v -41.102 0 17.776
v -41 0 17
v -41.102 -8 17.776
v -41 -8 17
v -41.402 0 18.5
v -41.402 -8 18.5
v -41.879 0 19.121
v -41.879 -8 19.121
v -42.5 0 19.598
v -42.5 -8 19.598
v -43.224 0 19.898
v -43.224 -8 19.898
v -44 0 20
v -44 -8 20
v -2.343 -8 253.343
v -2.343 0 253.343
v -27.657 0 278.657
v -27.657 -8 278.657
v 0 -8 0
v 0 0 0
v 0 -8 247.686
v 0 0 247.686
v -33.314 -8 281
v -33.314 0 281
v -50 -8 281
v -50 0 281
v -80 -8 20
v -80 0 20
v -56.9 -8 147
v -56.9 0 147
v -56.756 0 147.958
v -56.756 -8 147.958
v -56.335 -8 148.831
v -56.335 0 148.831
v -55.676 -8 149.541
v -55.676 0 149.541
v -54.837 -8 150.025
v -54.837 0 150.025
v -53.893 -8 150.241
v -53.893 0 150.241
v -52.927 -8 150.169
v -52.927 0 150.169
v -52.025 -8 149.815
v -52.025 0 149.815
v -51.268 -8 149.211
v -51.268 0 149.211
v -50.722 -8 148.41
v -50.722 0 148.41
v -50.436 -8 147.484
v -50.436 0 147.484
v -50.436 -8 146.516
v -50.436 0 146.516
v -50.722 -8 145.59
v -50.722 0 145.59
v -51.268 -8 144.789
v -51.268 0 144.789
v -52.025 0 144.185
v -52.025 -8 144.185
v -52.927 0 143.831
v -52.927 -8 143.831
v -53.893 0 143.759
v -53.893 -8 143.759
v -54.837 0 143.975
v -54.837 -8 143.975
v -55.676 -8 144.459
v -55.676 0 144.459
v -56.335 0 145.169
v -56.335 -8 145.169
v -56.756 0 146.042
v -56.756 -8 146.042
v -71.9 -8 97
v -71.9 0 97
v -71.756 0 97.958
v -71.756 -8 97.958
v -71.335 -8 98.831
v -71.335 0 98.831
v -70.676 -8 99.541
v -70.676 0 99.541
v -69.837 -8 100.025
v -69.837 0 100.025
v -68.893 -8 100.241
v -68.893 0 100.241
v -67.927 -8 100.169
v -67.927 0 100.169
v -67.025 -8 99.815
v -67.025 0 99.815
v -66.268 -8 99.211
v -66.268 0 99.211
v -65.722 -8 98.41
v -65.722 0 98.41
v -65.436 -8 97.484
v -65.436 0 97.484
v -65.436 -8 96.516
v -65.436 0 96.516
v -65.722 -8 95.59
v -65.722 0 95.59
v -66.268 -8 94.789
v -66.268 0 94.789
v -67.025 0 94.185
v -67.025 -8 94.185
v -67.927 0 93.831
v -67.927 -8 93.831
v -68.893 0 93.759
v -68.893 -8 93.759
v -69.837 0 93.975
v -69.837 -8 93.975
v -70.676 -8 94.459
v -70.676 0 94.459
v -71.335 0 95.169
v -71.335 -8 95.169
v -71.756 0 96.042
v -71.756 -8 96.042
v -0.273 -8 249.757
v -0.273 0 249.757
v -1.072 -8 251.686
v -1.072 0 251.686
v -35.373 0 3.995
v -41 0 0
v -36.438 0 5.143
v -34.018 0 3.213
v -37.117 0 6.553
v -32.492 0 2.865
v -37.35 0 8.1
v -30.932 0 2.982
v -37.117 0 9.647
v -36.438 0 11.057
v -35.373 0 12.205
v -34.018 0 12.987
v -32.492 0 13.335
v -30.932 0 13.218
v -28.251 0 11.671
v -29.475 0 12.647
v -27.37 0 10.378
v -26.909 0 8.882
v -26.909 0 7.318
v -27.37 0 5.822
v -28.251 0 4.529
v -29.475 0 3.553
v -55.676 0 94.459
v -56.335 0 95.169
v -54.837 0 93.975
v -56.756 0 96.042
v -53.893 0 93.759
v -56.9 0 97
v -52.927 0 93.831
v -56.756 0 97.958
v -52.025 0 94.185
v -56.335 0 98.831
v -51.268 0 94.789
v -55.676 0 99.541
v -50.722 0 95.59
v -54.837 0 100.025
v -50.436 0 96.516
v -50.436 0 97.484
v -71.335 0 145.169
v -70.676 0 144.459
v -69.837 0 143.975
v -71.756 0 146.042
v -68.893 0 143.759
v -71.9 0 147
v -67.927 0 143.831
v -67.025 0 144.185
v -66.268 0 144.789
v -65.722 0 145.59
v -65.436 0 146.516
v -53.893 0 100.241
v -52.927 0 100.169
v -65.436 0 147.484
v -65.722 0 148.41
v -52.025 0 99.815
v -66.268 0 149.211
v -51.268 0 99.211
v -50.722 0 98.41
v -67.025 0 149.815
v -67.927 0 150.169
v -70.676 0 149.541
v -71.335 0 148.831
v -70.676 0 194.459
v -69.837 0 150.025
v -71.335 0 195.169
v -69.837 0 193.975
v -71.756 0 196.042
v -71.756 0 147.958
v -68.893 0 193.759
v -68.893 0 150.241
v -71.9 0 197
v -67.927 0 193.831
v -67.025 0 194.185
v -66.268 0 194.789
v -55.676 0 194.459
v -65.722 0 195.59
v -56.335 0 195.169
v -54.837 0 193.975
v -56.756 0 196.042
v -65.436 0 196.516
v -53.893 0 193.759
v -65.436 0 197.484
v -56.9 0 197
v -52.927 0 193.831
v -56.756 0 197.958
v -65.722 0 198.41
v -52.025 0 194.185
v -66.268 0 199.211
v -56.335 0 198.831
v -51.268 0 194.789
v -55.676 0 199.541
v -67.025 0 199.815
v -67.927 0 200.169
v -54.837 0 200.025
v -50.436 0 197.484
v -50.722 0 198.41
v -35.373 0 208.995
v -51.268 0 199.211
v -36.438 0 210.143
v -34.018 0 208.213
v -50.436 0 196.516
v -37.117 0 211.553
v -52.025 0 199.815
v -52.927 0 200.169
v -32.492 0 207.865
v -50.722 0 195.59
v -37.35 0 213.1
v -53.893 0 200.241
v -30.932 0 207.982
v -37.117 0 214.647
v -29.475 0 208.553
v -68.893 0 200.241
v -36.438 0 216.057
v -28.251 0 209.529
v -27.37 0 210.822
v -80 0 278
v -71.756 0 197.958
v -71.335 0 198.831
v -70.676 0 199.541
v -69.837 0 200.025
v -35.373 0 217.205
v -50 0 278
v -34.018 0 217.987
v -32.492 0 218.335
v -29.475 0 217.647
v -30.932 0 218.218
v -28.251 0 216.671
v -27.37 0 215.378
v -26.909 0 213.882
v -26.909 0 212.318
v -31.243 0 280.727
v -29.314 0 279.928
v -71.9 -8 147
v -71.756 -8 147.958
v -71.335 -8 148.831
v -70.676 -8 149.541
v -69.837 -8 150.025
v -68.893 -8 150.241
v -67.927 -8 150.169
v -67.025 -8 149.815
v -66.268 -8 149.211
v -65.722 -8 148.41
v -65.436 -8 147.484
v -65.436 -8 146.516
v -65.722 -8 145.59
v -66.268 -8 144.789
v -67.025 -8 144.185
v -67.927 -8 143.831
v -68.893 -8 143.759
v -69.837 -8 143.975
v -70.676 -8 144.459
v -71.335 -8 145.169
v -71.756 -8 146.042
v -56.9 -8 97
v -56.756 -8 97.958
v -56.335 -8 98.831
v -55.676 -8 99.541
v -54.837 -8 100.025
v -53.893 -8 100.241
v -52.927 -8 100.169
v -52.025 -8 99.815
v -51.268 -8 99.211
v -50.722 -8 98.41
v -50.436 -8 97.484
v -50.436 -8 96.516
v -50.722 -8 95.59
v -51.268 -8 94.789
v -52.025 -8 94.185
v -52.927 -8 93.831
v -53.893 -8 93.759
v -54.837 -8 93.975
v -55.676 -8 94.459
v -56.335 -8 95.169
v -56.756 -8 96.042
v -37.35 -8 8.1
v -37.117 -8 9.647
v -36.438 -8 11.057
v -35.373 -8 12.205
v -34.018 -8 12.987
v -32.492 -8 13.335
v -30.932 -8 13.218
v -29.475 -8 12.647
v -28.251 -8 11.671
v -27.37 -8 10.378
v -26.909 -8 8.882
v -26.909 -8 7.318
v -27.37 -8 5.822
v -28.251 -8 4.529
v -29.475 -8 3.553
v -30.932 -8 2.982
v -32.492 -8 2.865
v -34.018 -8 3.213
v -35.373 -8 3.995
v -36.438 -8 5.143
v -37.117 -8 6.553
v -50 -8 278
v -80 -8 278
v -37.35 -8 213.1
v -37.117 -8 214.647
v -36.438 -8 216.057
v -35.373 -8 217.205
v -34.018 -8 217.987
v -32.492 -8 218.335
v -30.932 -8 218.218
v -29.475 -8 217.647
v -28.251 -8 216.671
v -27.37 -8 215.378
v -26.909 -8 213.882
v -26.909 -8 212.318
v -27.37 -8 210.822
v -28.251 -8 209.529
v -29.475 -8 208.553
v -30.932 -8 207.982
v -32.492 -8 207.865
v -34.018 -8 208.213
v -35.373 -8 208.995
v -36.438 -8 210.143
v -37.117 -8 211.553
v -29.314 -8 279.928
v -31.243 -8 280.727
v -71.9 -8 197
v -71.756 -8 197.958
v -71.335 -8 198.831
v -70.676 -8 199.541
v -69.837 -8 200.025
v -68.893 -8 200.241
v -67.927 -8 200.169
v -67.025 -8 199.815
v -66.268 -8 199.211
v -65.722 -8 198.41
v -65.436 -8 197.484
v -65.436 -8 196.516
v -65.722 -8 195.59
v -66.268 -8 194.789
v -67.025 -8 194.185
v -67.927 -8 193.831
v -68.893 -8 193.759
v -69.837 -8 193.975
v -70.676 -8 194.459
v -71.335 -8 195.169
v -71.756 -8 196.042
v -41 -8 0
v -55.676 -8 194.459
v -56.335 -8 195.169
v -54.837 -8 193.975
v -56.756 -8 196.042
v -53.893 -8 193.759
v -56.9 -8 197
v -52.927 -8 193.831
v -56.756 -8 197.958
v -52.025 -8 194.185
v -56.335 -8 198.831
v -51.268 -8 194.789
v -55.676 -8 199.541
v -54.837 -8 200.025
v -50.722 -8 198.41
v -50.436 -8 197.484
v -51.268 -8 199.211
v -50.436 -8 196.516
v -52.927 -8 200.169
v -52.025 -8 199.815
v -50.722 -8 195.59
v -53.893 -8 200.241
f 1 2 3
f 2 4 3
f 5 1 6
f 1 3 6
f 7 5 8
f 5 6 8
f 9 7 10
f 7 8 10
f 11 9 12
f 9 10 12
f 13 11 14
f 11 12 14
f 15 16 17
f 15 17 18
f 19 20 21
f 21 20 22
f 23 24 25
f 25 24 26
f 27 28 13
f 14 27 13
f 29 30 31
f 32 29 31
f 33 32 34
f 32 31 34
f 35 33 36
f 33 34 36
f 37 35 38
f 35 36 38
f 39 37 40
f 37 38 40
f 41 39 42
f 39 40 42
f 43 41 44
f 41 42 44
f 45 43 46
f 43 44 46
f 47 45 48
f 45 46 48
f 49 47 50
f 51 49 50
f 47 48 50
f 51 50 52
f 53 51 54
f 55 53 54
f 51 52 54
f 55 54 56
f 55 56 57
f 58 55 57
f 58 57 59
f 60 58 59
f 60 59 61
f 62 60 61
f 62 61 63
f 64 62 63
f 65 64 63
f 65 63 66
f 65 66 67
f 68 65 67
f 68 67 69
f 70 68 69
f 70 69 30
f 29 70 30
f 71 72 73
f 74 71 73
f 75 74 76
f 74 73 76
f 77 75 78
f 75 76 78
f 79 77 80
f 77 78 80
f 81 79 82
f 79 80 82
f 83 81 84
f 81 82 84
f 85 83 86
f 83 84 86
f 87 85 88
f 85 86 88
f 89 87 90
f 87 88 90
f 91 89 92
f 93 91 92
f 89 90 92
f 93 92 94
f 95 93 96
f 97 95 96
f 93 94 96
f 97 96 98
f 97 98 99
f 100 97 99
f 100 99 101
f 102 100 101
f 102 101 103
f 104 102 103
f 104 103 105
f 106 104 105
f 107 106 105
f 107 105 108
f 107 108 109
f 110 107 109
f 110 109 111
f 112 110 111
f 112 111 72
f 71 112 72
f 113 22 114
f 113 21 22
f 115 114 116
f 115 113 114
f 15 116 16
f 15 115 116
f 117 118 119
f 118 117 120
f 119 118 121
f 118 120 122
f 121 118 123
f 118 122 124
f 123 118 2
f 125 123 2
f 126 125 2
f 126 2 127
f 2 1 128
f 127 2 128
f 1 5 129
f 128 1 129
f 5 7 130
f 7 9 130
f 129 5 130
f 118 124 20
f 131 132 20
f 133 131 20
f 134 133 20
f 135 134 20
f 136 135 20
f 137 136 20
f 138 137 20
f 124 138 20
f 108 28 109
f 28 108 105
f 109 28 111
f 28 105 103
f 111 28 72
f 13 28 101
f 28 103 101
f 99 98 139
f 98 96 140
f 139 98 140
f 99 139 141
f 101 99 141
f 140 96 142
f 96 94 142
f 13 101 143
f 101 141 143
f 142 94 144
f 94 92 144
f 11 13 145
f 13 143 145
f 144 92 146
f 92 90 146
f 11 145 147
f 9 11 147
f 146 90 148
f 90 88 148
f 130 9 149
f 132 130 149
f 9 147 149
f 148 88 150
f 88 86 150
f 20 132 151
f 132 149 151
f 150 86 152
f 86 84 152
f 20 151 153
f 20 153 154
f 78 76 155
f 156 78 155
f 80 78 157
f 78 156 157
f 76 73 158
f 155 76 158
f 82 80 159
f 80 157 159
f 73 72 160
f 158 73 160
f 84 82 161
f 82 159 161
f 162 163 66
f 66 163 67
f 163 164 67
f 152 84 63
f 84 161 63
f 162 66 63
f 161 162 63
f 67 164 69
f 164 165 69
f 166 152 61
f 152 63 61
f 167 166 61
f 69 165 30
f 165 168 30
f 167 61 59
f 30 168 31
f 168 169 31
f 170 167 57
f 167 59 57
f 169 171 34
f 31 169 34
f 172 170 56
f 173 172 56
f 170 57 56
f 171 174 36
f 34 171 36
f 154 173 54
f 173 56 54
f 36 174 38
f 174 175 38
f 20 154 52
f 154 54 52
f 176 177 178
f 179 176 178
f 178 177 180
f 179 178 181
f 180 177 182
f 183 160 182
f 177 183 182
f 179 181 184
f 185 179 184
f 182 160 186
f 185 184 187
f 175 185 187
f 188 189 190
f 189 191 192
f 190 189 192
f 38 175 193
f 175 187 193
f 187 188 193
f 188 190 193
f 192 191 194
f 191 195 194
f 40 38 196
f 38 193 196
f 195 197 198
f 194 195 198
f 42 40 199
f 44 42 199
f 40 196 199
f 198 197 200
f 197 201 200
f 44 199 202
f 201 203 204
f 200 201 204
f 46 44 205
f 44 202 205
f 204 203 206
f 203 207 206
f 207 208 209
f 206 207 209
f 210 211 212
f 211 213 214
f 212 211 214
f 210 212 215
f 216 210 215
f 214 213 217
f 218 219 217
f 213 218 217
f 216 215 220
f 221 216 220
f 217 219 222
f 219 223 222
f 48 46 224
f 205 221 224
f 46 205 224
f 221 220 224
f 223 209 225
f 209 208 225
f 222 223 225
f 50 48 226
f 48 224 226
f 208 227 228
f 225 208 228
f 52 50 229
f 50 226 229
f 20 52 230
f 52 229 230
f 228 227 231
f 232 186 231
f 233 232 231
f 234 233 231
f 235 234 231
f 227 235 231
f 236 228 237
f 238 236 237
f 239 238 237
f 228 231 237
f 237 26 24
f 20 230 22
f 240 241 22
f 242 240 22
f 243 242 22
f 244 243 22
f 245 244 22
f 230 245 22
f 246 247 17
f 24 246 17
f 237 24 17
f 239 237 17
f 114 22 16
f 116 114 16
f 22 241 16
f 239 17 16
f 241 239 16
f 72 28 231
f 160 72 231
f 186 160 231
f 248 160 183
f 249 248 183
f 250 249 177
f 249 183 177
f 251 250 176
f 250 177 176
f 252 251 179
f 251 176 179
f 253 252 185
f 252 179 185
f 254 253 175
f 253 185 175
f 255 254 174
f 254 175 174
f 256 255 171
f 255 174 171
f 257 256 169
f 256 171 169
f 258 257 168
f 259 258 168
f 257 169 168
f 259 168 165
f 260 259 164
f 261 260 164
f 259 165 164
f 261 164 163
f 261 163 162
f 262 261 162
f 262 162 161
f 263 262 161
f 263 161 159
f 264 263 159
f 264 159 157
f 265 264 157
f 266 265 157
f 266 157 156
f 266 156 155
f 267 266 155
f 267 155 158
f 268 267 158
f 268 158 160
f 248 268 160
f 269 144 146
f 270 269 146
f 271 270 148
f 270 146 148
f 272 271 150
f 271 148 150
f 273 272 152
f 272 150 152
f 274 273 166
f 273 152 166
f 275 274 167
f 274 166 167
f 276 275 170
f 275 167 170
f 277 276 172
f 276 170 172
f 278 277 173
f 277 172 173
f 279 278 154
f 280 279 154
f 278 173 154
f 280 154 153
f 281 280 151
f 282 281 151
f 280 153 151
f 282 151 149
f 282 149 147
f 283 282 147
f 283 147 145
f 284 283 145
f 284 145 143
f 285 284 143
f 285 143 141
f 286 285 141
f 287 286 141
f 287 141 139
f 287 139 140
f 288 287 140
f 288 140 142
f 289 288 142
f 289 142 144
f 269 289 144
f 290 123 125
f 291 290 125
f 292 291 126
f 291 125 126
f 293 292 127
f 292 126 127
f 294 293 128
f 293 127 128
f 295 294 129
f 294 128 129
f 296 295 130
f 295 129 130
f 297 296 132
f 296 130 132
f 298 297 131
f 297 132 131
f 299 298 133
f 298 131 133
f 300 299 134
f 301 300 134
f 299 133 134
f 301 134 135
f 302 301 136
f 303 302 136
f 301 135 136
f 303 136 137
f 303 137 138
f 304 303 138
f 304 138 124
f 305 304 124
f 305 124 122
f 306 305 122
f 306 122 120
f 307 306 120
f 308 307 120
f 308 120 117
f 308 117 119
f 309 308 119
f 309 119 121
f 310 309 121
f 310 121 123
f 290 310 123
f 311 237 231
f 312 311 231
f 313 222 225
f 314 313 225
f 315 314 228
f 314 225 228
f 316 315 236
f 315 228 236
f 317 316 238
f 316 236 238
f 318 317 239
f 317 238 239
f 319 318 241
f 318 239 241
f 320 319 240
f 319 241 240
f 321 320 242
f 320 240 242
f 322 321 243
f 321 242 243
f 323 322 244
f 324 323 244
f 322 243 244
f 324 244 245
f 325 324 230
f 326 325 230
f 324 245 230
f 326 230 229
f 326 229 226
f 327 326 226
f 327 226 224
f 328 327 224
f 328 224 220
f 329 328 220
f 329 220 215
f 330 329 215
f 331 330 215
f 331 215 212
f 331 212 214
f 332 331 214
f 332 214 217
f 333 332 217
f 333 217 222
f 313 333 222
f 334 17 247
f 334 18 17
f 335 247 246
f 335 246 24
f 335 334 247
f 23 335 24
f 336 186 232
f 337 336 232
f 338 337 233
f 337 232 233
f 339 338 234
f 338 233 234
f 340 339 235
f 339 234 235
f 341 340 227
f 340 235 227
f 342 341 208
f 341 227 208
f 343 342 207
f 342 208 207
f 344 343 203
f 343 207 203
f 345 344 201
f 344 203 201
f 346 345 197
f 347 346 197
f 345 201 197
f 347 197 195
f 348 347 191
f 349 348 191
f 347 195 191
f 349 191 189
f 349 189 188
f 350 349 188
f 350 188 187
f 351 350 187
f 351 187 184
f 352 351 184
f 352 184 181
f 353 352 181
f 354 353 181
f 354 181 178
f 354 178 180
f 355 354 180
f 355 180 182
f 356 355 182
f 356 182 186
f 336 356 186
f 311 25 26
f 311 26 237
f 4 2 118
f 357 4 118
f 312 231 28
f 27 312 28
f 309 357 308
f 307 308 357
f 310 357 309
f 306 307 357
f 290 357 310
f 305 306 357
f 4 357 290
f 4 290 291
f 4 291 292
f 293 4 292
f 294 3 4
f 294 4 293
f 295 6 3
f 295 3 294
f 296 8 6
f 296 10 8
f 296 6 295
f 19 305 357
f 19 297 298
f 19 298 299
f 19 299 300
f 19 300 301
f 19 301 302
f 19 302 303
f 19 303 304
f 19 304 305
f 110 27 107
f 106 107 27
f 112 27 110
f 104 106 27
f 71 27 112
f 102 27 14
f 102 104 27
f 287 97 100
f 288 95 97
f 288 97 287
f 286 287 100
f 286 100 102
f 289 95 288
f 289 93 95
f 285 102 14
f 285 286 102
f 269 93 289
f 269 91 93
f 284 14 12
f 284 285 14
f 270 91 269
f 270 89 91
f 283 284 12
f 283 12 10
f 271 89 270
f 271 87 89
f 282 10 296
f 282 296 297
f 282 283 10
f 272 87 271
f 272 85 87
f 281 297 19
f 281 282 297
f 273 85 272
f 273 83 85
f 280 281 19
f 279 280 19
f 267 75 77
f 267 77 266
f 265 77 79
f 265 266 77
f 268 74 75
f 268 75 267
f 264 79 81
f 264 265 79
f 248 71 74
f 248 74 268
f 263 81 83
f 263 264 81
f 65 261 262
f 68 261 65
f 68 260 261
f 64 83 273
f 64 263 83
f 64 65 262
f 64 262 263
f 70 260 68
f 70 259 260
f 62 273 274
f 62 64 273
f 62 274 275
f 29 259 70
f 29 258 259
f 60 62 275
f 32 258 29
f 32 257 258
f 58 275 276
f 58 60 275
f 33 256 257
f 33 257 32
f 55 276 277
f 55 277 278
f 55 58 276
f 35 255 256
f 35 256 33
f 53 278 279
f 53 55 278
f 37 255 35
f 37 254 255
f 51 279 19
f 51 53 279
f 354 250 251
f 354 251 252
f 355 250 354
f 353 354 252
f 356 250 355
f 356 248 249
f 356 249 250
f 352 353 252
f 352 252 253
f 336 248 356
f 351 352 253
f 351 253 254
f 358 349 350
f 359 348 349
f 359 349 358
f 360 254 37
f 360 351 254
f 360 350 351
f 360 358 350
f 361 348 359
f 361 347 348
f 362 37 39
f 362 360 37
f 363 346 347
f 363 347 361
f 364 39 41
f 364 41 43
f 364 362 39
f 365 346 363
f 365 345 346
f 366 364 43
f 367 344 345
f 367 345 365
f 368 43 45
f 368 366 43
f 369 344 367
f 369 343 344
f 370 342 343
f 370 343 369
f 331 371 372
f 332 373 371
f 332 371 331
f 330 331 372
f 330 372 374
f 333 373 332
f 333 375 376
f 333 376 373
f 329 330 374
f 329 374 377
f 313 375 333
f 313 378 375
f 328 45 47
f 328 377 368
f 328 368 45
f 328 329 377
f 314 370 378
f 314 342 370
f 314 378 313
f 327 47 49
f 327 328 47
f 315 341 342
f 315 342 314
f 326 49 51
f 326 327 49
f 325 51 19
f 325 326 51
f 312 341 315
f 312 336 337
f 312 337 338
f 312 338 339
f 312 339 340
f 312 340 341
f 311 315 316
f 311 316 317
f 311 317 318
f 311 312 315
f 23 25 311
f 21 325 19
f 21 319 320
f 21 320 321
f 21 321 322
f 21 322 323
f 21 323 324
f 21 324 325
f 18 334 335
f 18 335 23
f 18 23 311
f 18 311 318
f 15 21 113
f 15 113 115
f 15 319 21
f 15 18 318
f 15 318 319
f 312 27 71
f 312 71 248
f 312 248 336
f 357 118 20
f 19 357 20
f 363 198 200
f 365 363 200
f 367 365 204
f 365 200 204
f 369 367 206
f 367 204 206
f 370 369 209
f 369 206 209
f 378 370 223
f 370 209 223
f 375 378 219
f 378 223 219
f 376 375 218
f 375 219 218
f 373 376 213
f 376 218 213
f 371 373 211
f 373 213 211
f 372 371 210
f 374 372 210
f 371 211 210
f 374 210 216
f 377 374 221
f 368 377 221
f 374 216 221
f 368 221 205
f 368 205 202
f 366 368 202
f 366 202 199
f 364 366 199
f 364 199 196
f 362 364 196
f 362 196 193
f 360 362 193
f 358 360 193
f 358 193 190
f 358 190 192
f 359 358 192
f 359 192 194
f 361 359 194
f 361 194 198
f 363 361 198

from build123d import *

# Parameters (mm, degrees)
F1_DEPTH = 8
F2_SIZE  = 30
F3_R     = 8
F4_R     = 3
F6_D     = 6.5
F8_D     = 10.5


with BuildPart() as f1:
    # F0 (on Front) → F1 (new body)
    with BuildSketch(Plane.XZ):
        Polygon((-41, 0), (0, 0), (0, 281), (-50, 281), (-50, 278), (-80, 278), (-80, 20), (-41, 20), align=None)
    extrude(amount=F1_DEPTH)

    # F2
    f2_edges = [f1.edges().sort_by_distance(p)[0] for p in [
        (0, -4, 281),
    ]]
    chamfer(f2_edges, length=F2_SIZE)

    # F3
    f3_edges = [f1.edges().sort_by_distance(p)[0] for p in [
        (-30, -4, 281),
        (0, -4, 251),
    ]]
    fillet(f3_edges, radius=F3_R)

    # F4
    f4_edges = [f1.edges().sort_by_distance(p)[0] for p in [
        (-41, -4, 20),
    ]]
    fillet(f4_edges, radius=F4_R)

    # F6 (through all)
    with Locations(Plane.XZ.offset(8)):
        with Locations((-68.65, 197), (-53.65, 197), (-53.65, 147), (-68.65, 147), (-53.65, 97), (-68.65, 97)):
            Hole(F6_D / 2)

    # F8 (through all)
    with Locations(Plane.XZ.offset(8)):
        with Locations((-32.1, 213.1), (-32.1, 8.1)):
            Hole(F8_D / 2)


solid = f1.part
